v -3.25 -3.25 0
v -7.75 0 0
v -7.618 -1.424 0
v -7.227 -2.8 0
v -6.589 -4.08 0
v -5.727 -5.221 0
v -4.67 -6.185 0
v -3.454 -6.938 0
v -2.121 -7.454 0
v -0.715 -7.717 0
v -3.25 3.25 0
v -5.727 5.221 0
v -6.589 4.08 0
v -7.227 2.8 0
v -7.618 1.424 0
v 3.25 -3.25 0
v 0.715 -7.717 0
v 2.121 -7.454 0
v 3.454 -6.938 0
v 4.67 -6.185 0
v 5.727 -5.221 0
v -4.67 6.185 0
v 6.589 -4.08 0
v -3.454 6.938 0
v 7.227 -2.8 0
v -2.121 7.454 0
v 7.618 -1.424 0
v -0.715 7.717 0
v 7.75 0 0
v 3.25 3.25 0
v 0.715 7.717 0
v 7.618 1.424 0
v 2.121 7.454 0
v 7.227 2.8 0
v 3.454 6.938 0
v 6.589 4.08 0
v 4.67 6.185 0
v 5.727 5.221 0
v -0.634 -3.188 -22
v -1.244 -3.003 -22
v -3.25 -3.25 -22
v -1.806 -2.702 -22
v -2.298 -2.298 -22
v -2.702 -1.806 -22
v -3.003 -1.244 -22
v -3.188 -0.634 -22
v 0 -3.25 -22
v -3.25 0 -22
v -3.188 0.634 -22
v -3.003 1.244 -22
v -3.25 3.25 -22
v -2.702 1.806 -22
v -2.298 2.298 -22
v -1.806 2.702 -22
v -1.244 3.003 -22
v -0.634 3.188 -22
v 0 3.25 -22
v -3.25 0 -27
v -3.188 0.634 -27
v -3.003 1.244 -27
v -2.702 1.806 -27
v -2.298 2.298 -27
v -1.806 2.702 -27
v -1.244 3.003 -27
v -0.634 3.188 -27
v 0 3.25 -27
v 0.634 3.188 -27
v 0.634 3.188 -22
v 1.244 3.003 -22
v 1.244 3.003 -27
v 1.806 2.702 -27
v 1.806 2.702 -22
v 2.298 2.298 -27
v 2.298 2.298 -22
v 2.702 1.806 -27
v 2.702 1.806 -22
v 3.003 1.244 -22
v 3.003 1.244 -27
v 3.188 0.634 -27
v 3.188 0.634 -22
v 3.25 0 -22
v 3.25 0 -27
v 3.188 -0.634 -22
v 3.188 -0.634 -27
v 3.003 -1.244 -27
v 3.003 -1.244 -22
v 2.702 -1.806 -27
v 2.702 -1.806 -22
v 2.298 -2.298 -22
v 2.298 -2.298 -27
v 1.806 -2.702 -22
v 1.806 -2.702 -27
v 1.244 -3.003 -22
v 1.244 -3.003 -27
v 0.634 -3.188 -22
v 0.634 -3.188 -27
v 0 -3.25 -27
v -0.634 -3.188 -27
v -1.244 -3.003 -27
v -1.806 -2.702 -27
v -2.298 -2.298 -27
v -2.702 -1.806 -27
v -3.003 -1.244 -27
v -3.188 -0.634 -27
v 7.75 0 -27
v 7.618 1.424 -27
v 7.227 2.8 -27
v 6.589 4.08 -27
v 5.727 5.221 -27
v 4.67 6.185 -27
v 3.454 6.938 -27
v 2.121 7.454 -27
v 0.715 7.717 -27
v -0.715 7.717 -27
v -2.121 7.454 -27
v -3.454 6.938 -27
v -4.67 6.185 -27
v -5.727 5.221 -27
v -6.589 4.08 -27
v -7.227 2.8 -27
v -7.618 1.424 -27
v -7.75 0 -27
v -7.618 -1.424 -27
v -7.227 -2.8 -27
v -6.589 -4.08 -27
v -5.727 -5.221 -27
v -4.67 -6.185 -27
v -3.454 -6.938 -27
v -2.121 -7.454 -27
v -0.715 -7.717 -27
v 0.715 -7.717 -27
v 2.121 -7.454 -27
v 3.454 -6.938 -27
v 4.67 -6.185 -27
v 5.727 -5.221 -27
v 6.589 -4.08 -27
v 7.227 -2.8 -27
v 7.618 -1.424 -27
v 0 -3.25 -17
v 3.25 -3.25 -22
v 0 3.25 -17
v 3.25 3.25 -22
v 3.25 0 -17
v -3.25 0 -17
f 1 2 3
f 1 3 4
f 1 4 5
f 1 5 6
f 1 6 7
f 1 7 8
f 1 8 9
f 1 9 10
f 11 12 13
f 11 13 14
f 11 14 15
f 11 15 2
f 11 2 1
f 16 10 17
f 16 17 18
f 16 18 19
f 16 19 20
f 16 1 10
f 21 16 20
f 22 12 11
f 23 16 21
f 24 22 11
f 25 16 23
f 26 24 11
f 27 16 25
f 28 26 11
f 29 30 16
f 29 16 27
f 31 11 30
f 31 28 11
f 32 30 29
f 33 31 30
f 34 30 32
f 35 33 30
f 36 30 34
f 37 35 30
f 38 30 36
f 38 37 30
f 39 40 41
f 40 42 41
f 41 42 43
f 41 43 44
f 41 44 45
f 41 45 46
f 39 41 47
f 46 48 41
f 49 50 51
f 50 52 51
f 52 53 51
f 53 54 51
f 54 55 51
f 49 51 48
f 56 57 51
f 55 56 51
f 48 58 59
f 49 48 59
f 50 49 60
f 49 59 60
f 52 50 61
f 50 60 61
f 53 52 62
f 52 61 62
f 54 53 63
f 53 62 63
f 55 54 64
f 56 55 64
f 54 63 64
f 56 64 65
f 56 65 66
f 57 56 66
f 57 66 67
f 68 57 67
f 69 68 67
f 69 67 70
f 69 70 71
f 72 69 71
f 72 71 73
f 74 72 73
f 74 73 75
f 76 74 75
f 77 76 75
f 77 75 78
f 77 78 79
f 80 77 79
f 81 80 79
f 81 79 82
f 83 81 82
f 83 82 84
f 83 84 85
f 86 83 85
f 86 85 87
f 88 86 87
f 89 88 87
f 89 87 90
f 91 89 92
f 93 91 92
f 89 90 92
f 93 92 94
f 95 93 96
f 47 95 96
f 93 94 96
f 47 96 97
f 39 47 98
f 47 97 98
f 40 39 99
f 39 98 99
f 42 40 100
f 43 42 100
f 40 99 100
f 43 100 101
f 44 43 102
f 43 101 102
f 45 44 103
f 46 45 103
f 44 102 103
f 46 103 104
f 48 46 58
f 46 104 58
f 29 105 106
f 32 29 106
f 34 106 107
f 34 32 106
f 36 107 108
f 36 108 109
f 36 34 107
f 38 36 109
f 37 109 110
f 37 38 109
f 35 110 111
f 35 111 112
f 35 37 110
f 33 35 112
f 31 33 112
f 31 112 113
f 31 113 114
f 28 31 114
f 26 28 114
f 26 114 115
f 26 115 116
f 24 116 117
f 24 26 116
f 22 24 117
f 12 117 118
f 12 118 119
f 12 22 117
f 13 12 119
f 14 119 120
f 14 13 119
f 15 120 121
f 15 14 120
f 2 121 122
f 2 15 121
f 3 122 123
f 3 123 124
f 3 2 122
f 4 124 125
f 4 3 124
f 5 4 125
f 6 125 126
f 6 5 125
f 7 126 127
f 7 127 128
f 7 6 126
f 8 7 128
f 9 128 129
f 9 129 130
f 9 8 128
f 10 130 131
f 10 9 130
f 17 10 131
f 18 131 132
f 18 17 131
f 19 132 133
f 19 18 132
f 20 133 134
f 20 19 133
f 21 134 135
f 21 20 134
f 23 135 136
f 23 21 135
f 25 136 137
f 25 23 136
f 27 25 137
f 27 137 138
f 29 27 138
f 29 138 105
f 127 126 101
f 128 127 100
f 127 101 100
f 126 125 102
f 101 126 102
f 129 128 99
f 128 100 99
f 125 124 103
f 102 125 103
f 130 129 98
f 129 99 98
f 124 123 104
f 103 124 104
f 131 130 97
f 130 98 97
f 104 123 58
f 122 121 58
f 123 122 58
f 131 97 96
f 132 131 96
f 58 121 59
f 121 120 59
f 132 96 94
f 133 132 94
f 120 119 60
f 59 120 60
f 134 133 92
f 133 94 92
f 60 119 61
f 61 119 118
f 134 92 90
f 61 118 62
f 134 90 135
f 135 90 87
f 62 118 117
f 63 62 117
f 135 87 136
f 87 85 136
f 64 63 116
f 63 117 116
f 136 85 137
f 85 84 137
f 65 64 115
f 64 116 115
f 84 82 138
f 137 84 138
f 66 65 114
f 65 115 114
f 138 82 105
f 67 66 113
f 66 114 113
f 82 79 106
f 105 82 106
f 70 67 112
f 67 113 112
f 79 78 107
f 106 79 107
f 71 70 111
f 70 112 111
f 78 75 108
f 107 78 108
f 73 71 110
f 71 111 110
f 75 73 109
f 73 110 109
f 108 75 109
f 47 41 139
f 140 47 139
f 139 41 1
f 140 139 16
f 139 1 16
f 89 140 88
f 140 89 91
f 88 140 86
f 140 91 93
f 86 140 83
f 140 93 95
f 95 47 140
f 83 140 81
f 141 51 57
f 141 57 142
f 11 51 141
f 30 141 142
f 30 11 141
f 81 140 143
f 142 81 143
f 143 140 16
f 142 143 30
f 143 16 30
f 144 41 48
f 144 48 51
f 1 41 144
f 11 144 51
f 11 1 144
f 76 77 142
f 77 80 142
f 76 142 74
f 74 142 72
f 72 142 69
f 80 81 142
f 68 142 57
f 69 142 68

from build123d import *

# Parameters (mm, degrees)
CROQUIS1_R              = 7.75
SALIENTE_EXTRUIR1_DEPTH = 27
CROQUIS2_W              = 6.5
CROQUIS2_H              = 6.5
CORTAR_EXTRUIR1_DEPTH   = 30.139749484
CROQUIS3_R              = 5
SALIENTE_EXTRUIR2_DEPTH = 5
CROQUIS4_R              = 1.75
CORTAR_EXTRUIR2_DEPTH   = 30.139749484
CROQUIS5_R              = 3.25
CORTAR_EXTRUIR3_DEPTH   = 10


with BuildPart() as part:
    # Croquis1 → Saliente-Extruir1 (new body)
    with BuildSketch(Plane.XY):
        Circle(CROQUIS1_R)
    extrude(amount=-SALIENTE_EXTRUIR1_DEPTH)

    # Croquis2 → Cortar-Extruir1 (cut, through all)
    with BuildSketch(Plane.XY):
        Rectangle(CROQUIS2_W, CROQUIS2_H)
    extrude(amount=-CORTAR_EXTRUIR1_DEPTH, mode=Mode.SUBTRACT)

    # Croquis3 → Saliente-Extruir2 (add)
    with BuildSketch(Plane(origin=(0, 0, -27), x_dir=(-1, 0, 0), z_dir=(0, 0, -1))):
        Circle(CROQUIS3_R)
    extrude(amount=-SALIENTE_EXTRUIR2_DEPTH)

    # Croquis4 → Cortar-Extruir2 (cut, through all)
    with BuildSketch(Plane(origin=(0, 0, -27), x_dir=(-1, 0, 0), z_dir=(0, 0, -1))):
        Circle(CROQUIS4_R)
    extrude(amount=-CORTAR_EXTRUIR2_DEPTH, mode=Mode.SUBTRACT)

    # Croquis5 → Cortar-Extruir3 (cut)
    with BuildSketch(Plane(origin=(0, 0, -27), x_dir=(-1, 0, 0), z_dir=(0, 0, -1))):
        Circle(CROQUIS5_R)
    extrude(amount=-CORTAR_EXTRUIR3_DEPTH, mode=Mode.SUBTRACT)


solid = part.part
